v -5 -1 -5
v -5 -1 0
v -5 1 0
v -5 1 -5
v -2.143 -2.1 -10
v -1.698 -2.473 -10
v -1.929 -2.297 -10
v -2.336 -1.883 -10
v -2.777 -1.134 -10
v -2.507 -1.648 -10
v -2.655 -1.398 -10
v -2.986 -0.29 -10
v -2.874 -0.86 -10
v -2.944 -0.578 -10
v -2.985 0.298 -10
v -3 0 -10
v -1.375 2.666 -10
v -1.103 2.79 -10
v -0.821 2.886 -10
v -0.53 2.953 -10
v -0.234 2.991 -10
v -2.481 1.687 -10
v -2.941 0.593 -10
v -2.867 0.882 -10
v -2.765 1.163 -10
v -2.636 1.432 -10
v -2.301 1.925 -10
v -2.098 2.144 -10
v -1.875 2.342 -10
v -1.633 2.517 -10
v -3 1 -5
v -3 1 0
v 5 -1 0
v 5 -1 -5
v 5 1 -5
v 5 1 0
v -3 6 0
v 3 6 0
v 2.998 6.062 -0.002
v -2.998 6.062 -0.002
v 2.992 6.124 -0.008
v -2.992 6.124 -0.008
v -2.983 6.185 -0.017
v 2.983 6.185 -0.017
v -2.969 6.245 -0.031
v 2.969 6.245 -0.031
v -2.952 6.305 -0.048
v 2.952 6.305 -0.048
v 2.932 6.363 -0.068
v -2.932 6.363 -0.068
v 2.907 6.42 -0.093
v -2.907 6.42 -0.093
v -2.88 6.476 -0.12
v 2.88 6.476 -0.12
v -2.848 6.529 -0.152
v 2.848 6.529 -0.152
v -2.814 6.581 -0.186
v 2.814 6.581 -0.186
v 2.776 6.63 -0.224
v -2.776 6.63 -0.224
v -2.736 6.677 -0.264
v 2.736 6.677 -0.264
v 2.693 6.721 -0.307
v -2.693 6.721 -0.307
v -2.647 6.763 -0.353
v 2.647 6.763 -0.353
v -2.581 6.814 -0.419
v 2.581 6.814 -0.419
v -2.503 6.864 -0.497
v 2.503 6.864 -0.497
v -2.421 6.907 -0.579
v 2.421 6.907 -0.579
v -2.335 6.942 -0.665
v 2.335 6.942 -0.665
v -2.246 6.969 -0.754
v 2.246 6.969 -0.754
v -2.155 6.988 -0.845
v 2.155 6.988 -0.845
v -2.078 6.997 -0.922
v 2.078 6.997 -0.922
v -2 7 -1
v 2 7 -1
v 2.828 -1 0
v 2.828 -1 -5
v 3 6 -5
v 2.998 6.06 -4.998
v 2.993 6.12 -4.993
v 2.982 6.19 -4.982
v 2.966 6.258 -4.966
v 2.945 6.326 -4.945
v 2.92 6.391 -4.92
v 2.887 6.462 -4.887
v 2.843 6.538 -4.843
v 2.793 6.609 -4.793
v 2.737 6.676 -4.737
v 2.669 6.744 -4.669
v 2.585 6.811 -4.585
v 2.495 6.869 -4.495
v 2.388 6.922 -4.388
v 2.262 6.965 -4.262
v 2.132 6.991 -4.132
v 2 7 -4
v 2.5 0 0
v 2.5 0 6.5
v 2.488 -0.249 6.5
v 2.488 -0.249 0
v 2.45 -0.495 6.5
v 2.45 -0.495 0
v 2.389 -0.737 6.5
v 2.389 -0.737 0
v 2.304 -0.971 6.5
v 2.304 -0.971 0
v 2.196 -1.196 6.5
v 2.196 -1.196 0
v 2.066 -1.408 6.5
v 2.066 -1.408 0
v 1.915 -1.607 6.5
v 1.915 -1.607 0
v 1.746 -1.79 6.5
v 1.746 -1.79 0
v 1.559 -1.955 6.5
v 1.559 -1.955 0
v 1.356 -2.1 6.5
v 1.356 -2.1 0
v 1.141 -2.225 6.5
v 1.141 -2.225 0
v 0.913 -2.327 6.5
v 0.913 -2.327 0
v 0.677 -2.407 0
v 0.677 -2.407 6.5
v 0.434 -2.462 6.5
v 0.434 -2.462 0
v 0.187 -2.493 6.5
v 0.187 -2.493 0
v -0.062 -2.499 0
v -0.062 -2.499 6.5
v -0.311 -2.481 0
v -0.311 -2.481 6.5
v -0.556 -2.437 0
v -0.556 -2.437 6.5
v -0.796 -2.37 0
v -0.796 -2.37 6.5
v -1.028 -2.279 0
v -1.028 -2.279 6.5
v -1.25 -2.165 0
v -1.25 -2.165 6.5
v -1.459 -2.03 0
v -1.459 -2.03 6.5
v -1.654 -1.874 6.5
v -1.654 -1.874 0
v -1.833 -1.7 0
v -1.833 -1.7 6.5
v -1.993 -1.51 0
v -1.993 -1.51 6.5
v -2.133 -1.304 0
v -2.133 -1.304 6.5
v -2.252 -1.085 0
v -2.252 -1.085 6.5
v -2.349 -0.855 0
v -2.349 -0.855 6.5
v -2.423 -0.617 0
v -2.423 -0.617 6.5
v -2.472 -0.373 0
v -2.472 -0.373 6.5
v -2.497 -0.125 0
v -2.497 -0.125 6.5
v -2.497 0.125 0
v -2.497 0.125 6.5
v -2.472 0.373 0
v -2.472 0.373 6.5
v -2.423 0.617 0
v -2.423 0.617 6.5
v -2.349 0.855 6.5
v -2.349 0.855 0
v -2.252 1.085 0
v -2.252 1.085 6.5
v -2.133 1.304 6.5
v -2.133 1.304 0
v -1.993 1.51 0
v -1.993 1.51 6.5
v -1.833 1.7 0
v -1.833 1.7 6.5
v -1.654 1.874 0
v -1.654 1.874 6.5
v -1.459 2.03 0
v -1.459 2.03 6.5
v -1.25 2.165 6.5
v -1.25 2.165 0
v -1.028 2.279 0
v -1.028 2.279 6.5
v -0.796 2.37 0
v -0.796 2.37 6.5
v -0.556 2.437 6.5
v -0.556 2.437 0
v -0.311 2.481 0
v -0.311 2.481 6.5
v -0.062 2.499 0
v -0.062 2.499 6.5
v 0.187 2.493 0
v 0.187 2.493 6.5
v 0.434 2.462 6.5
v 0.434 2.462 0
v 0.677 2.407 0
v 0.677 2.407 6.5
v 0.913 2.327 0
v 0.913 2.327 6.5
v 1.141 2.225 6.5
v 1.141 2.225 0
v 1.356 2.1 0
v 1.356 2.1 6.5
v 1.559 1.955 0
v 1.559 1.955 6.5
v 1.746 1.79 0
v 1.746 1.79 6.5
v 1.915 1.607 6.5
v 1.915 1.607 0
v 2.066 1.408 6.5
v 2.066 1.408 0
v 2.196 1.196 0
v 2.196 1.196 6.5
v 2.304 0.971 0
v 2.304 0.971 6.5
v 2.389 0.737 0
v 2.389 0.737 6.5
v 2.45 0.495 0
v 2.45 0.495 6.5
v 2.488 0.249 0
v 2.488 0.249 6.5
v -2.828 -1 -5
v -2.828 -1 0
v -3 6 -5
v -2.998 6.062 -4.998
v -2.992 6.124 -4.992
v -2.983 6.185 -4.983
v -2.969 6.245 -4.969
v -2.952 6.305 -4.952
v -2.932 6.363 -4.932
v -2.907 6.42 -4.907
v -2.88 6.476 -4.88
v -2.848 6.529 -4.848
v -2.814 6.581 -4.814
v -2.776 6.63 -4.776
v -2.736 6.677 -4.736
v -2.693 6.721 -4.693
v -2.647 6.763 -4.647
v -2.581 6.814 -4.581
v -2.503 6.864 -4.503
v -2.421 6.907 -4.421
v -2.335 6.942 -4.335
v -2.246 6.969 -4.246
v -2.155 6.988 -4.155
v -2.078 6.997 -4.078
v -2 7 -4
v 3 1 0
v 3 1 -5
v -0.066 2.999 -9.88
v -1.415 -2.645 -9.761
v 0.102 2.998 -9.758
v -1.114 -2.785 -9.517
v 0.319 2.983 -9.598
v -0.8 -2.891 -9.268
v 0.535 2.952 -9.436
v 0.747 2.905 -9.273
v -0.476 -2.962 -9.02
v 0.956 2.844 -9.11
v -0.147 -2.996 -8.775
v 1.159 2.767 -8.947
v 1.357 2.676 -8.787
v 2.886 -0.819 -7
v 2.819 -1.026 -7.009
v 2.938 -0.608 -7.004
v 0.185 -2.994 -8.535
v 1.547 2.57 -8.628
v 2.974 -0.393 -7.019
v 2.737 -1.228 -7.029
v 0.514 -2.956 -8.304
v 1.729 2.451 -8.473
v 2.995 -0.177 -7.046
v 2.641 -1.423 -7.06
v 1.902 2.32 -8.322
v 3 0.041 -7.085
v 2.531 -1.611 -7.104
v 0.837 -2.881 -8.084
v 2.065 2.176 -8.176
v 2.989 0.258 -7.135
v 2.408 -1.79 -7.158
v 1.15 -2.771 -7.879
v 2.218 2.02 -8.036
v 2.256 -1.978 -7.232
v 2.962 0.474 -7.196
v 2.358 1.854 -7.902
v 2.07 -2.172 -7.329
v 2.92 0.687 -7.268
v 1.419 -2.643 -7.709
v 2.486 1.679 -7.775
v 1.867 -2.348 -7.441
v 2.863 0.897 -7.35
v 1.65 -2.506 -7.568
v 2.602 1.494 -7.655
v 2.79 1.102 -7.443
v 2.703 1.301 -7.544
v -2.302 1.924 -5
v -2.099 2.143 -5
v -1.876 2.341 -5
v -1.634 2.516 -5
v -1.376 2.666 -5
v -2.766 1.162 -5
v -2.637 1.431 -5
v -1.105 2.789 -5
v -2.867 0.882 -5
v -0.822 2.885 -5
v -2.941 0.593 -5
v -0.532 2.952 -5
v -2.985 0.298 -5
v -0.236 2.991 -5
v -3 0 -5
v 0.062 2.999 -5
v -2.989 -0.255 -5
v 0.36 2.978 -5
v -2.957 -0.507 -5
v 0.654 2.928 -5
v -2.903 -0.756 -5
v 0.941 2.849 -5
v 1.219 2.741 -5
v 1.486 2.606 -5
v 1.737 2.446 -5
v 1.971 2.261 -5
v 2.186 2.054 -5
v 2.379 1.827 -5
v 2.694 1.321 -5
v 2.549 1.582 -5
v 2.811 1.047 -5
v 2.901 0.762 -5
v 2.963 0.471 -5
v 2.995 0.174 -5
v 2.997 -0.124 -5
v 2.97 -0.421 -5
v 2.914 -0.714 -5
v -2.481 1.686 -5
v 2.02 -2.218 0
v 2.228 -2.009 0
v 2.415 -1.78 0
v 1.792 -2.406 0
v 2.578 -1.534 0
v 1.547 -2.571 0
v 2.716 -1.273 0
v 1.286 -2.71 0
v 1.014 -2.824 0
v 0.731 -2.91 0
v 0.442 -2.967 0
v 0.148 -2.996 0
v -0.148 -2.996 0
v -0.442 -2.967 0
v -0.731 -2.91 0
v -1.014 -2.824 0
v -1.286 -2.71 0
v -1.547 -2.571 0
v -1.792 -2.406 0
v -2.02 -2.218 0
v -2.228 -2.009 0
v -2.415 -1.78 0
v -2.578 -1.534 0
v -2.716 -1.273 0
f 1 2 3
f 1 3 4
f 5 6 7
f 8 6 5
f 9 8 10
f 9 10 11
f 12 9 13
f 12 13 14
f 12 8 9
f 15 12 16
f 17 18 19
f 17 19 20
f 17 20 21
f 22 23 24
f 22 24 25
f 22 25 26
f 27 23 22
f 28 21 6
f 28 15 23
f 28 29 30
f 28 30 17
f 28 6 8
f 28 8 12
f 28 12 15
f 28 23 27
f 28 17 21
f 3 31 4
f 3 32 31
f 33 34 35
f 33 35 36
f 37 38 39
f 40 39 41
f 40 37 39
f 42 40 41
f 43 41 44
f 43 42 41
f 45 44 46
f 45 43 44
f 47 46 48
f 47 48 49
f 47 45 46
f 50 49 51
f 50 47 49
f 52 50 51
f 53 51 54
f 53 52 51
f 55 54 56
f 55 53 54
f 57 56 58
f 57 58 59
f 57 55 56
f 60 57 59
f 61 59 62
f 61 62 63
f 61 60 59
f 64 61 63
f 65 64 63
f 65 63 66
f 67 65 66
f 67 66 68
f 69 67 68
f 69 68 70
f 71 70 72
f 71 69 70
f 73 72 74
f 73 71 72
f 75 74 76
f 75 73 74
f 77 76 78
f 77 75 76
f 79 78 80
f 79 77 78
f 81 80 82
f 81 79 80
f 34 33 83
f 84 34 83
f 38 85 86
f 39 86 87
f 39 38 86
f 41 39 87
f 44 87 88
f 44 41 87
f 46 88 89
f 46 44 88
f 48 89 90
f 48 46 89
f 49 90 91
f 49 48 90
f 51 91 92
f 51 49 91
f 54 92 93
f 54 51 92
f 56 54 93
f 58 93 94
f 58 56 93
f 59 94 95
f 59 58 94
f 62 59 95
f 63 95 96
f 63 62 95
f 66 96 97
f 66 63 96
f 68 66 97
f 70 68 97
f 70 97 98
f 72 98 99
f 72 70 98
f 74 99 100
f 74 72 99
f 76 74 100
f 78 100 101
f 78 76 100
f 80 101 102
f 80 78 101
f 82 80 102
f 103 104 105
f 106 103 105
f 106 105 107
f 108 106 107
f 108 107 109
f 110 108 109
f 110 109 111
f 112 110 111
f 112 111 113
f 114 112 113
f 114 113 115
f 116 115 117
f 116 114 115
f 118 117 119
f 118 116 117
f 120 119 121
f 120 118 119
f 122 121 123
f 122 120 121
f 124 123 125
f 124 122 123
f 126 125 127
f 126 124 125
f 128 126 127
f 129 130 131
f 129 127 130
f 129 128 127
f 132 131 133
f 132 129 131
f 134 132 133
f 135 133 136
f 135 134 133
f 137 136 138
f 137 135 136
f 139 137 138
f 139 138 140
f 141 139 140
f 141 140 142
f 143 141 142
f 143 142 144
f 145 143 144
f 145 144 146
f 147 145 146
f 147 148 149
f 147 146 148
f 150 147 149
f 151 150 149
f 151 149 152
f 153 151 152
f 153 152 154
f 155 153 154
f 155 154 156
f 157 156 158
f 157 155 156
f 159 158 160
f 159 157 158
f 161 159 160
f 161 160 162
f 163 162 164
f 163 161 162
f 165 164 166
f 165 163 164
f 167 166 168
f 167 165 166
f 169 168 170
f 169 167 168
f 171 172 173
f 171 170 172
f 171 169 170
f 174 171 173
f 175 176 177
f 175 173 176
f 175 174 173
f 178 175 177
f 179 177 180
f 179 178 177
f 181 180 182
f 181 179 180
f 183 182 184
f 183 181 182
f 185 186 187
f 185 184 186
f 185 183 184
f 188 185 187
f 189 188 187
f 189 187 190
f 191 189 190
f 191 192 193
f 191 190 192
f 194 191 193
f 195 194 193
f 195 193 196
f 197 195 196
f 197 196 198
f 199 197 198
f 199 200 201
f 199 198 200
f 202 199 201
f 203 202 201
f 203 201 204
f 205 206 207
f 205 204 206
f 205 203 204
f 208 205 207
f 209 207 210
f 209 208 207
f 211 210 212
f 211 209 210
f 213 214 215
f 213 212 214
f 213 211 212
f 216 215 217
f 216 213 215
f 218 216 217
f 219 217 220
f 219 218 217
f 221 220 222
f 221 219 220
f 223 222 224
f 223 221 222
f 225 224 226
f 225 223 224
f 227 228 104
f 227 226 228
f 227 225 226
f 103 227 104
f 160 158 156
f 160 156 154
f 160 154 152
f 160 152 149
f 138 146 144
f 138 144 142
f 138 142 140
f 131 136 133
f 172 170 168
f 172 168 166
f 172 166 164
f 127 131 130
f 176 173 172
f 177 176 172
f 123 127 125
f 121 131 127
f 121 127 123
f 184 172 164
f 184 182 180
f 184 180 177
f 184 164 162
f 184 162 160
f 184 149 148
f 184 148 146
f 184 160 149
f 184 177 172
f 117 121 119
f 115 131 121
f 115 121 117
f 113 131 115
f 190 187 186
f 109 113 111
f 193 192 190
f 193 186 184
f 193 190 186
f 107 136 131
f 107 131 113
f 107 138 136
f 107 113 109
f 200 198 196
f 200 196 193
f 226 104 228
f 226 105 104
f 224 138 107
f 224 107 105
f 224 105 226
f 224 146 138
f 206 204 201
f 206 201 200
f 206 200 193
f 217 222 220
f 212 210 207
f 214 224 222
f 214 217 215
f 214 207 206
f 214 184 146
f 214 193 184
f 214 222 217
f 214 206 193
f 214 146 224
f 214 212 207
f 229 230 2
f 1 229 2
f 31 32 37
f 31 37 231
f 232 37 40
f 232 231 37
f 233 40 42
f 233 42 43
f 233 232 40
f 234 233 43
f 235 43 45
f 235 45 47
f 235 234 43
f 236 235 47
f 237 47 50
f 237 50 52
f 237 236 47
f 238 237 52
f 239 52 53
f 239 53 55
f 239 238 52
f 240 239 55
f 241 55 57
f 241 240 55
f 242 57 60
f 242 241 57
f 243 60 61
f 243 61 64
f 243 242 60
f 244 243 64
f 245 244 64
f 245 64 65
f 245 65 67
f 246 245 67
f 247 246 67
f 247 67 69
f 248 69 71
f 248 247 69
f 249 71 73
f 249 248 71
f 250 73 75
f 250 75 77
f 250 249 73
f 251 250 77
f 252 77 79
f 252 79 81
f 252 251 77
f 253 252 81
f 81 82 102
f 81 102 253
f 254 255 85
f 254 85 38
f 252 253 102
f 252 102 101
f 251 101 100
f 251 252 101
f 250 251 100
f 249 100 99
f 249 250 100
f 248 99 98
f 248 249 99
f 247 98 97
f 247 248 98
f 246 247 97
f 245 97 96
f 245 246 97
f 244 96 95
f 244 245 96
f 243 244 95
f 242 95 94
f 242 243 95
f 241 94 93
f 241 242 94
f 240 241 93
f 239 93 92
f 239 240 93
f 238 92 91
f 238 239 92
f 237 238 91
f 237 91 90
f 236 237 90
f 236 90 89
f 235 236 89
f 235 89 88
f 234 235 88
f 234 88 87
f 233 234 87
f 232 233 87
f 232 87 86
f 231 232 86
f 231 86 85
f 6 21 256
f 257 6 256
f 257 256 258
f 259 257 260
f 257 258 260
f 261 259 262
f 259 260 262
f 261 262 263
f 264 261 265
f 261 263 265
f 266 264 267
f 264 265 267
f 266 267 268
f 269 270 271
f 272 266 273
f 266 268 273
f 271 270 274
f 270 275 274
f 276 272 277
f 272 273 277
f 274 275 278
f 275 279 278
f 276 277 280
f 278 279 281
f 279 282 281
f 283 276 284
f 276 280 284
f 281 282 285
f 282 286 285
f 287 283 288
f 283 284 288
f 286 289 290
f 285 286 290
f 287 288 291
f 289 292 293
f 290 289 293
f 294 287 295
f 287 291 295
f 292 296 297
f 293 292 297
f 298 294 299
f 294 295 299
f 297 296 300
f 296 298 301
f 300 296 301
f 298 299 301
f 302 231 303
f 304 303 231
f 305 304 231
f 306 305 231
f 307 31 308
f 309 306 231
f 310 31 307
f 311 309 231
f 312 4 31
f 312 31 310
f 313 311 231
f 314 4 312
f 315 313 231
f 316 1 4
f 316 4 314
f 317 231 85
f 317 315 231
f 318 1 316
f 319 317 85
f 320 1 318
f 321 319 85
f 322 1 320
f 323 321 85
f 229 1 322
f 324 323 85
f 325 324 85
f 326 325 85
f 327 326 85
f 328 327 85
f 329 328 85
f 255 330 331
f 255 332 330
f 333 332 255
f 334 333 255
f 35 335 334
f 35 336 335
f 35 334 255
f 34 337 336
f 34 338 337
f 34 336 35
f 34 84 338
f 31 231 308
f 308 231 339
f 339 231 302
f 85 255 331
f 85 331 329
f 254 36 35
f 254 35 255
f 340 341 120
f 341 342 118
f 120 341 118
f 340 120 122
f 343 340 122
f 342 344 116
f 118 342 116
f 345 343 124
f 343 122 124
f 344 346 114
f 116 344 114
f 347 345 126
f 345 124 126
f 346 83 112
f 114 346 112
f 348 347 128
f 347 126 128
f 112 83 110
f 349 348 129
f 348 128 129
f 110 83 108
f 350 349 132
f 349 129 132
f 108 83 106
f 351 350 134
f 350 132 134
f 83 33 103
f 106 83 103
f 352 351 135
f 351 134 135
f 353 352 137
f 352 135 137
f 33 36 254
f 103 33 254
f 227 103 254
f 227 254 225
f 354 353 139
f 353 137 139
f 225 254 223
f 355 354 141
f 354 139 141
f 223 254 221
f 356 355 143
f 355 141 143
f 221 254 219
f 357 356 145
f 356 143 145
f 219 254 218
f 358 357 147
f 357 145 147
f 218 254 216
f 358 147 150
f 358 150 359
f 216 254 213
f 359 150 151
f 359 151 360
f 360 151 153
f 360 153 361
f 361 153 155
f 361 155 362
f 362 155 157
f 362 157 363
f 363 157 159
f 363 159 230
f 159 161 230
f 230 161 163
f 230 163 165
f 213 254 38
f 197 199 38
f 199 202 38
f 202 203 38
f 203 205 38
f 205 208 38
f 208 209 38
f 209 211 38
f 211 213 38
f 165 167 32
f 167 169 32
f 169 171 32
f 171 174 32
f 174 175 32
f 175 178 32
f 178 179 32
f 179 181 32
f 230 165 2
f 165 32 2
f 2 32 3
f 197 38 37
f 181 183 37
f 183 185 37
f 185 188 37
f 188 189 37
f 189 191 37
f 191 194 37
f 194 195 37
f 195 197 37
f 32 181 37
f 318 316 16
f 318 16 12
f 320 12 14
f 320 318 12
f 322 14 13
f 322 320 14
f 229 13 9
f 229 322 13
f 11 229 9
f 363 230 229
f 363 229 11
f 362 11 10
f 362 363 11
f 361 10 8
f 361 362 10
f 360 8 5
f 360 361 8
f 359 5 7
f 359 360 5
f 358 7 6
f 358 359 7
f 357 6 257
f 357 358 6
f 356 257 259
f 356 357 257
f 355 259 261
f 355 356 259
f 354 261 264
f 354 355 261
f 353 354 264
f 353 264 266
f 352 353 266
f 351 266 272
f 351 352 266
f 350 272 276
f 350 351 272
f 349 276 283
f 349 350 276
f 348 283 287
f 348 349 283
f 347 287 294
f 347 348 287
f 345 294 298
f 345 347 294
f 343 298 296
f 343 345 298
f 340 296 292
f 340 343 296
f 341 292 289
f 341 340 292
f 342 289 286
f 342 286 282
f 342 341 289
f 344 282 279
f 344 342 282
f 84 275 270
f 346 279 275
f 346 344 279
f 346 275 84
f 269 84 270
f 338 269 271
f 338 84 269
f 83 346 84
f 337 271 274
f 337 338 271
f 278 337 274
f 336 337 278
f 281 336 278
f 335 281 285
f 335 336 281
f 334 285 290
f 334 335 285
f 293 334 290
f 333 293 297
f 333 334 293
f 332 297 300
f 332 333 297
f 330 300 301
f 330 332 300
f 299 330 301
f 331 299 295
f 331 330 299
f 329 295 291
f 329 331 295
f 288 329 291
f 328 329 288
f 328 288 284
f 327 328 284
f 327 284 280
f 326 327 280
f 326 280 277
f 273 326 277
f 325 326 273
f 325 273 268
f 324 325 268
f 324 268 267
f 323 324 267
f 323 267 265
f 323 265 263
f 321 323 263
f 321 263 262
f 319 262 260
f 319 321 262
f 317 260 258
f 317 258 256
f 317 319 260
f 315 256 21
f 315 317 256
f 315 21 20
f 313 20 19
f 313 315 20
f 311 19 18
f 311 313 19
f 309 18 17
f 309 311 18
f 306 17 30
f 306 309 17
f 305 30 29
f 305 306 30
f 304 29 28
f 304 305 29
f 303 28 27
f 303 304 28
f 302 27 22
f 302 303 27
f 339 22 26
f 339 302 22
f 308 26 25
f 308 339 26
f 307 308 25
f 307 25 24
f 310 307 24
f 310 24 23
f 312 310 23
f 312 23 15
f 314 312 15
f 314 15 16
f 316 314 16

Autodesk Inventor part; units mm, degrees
sketch "スケッチ1" plane through (0, 0, 0) normal (0, 0, 1) x (1, 0, 0)
  point P0 (0, 0)
sketch "スケッチ2" plane through (0, 0, 0) normal (0, 0, 1) x (1, 0, 0)
  circle A0 centre (0, 0) radius 2.5
  dimension "d0" = 5
extrude "押し出し1" add sketch "スケッチ2" along normal blind 6.5
sketch "スケッチ3" plane through (0, 0, 0) normal (0, 0, -1) x (-1, 0, 0)
  circle A0 centre (0, 0) radius 3
  dimension "d3" = 6
extrude "押し出し2" add sketch "スケッチ3" along normal blind 10
sketch "スケッチ4" plane through (0, 0, 0) normal (0, 0, 1) x (1, 0, 0)
  circle A0 centre (0, 0) radius 3 projected
  point P0 (0, 3)
ref_plane "作業平面2" through (0, 0, 0) normal (0, 1, 0) x (-1, 0, 0)
ref_plane "作業平面1" through (0, 3, 0) normal (0, 1, 0) x (-1, 0, 0)
sketch "スケッチ5" plane through (0, 0, 0) normal (0, 1, 0) x (-1, 0, 0)
  line L0 (5, -5) -> (-5, -5)
  line L1 (-5, -5) -> (-5, 0)
  line L2 (-5, 0) -> (5, 0)
  line L3 (5, 0) -> (5, -5)
  point P0 (0, 0)
  dimension "d7" = 10
  dimension "d8" = 5
  dimension "d9" = 5
extrude "押し出し3" add sketch "スケッチ5" along normal mid plane 2
sketch "スケッチ6" plane through (0, 0, 0) normal (0, 1, 0) x (-1, 0, 0)
  line L0 (5, -5) -> (2.8284, -5) projected
  line L1 (-2.8284, 0) -> (-5, 0) projected
  line L2 (3, -5) -> (-3.9142, -5)
  line L3 (-3.9142, -5) -> (-3.9142, 0)
  line L4 (-3.9142, 0) -> (3, 0)
  line L5 (3, 0) -> (3, -5)
  line L6 (3.5037, -5) -> (-3, -5)
  line L7 (-3, -5) -> (-3, 0)
  line L8 (-3, 0) -> (3.5037, 0)
  line L9 (3.5037, 0) -> (3.5037, -5)
  point P0 (0, 0)
  dimension "d12" = 6
  dimension "d13" = 3
extrude "押し出し4" add sketch "スケッチ6" along normal blind 7 contours L0 L2 L7 L1 L4 L5
fillet "フィレット1" radius 1 4 edges at (0, 7, 0) (-3, 7, -2.5) (0, 7, -5) (3, 7, -2.5)
sketch "スケッチ7" plane through (0, 0, -10) normal (0, 0, -1) x (-1, 0, 0)
  arc A0 (2.8284, -1) -> (-2.8284, -1) centre (0, 0) ccw projected
  point P0 (3, 0)
ref_plane "作業平面3" through (-3, 0, -10) normal (-1, 0, 0) x (0, -1, 0)
sketch "スケッチ12" plane through (0, 0, -10) normal (0, 0, -1) x (-1, 0, 0)
  circle A0 centre (0, 0) radius 3 construction
  arc A1 (2.8284, -1) -> (-2.8284, -1) centre (0, 0) ccw construction
  line L0 (-0.7765, 2.8978) -> (0.7765, -2.8978) construction
  circle A2 centre (0, 0) radius 3 construction
  line L1 (3, 0) -> (-3, 0) construction
  dimension "d22" = 105
ref_plane "作業平面6" through (0.7765, 2.8978, -10) normal (-0.2588, -0.9659, 0) x (0.9659, -0.2588, 0)
sketch "スケッチ13" plane through (0.7765, 2.8978, -10) normal (-0.2588, -0.9659, 0) x (0.9659, -0.2588, 0)
  line L0 (-3, 0) -> (3, 0) projected
  line L1 (3, 0) -> (3, 3)
  line L2 (3, 5) -> (3, 0) projected
  line L3 (3, 0) -> (-1, 0)
  line L4 (-1, 0) -> (3, 3)
  point P0 (0, 10)
  dimension "d23" = 3
  dimension "d24" = 4
extrude "押し出し6" cut sketch "スケッチ13" along normal through all
equation "\"d9\" = 0.5 * d7"
equation "\"d13\" = 0.5 * d12"
properties part number "スライド"
